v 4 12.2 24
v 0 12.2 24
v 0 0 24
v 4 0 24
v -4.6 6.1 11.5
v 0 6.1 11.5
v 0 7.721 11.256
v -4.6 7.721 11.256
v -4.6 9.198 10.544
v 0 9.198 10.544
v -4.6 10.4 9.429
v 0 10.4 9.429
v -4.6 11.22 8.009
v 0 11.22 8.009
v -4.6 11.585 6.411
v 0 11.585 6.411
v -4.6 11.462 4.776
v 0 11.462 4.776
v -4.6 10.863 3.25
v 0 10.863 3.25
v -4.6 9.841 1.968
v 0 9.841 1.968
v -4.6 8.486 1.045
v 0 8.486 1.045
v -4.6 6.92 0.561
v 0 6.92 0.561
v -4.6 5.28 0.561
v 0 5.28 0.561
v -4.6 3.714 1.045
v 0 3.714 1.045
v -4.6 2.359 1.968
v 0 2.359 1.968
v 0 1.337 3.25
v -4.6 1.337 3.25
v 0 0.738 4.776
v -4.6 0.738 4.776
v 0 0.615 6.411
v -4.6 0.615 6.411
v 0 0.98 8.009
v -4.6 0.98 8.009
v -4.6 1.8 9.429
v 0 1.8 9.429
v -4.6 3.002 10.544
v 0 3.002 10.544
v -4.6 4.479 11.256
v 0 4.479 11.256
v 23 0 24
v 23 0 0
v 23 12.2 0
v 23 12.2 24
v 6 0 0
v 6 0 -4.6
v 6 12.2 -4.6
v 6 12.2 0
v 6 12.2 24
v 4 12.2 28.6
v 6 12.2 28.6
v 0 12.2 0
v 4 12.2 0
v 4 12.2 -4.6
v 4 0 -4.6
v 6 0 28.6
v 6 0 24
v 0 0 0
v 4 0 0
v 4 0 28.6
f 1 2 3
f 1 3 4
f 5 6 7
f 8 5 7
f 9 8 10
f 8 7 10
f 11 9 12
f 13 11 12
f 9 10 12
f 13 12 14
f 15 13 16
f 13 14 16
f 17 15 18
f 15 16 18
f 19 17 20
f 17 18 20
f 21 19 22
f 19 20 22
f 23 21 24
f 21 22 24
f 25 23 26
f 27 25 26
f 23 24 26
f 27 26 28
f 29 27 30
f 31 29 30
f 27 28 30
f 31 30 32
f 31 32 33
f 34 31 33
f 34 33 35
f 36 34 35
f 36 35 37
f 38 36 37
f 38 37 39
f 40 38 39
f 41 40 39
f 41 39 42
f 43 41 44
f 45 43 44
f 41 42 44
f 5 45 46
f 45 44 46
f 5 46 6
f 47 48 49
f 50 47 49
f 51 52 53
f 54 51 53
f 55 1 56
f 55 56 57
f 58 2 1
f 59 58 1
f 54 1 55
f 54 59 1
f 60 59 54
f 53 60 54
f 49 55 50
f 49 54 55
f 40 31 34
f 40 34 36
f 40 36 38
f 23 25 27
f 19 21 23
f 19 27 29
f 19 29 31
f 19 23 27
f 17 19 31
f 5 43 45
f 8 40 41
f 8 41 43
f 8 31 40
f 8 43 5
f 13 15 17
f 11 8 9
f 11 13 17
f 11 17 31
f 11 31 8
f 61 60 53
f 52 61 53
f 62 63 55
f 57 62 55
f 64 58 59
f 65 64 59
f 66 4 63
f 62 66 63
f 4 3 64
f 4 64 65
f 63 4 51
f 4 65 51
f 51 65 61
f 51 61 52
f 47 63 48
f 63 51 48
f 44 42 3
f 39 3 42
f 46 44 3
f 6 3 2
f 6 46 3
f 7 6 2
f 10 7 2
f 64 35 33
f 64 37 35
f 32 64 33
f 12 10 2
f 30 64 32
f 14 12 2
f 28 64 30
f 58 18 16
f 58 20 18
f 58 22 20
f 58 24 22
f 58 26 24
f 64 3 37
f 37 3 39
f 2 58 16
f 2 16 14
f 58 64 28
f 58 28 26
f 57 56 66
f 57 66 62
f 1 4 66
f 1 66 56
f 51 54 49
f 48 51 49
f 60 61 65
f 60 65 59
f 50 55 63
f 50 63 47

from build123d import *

# Parameters (mm, degrees)
SKETCH_1_W           = 23
SKETCH_1_H           = 12.2
EXTRUDE_1_DEPTH      = 24
EXTRUDE_2_DEPTH      = 4.6
EXTRUDE_2_DEPTH_BACK = 28.6
SKETCH_2_W           = 2
SKETCH_2_H           = 12.2
SKETCH_3_R           = 5.5
EXTRUDE_3_DEPTH      = 4.6


with BuildPart() as part:
    # 草图1 → 凸台-拉伸1 (new body)
    with BuildSketch(Plane.XY):
        with Locations((11.5, 6.1)):
            Rectangle(SKETCH_1_W, SKETCH_1_H)
    extrude(amount=EXTRUDE_1_DEPTH)

    # 草图2 → 凸台-拉伸2 (add, two sides: drawn at the far end of the back side and taken through both)
    with BuildSketch(Plane.XY.offset(24).offset(-EXTRUDE_2_DEPTH_BACK)):
        with Locations((5, 6.1)):
            Rectangle(SKETCH_2_W, SKETCH_2_H)
    extrude(amount=EXTRUDE_2_DEPTH + EXTRUDE_2_DEPTH_BACK)

    # 草图3 → 凸台-拉伸3 (add)
    with BuildSketch(Plane.ZY):
        with Locations((6, 6.1)):
            Circle(SKETCH_3_R)
    extrude(amount=EXTRUDE_3_DEPTH)


solid = part.part
